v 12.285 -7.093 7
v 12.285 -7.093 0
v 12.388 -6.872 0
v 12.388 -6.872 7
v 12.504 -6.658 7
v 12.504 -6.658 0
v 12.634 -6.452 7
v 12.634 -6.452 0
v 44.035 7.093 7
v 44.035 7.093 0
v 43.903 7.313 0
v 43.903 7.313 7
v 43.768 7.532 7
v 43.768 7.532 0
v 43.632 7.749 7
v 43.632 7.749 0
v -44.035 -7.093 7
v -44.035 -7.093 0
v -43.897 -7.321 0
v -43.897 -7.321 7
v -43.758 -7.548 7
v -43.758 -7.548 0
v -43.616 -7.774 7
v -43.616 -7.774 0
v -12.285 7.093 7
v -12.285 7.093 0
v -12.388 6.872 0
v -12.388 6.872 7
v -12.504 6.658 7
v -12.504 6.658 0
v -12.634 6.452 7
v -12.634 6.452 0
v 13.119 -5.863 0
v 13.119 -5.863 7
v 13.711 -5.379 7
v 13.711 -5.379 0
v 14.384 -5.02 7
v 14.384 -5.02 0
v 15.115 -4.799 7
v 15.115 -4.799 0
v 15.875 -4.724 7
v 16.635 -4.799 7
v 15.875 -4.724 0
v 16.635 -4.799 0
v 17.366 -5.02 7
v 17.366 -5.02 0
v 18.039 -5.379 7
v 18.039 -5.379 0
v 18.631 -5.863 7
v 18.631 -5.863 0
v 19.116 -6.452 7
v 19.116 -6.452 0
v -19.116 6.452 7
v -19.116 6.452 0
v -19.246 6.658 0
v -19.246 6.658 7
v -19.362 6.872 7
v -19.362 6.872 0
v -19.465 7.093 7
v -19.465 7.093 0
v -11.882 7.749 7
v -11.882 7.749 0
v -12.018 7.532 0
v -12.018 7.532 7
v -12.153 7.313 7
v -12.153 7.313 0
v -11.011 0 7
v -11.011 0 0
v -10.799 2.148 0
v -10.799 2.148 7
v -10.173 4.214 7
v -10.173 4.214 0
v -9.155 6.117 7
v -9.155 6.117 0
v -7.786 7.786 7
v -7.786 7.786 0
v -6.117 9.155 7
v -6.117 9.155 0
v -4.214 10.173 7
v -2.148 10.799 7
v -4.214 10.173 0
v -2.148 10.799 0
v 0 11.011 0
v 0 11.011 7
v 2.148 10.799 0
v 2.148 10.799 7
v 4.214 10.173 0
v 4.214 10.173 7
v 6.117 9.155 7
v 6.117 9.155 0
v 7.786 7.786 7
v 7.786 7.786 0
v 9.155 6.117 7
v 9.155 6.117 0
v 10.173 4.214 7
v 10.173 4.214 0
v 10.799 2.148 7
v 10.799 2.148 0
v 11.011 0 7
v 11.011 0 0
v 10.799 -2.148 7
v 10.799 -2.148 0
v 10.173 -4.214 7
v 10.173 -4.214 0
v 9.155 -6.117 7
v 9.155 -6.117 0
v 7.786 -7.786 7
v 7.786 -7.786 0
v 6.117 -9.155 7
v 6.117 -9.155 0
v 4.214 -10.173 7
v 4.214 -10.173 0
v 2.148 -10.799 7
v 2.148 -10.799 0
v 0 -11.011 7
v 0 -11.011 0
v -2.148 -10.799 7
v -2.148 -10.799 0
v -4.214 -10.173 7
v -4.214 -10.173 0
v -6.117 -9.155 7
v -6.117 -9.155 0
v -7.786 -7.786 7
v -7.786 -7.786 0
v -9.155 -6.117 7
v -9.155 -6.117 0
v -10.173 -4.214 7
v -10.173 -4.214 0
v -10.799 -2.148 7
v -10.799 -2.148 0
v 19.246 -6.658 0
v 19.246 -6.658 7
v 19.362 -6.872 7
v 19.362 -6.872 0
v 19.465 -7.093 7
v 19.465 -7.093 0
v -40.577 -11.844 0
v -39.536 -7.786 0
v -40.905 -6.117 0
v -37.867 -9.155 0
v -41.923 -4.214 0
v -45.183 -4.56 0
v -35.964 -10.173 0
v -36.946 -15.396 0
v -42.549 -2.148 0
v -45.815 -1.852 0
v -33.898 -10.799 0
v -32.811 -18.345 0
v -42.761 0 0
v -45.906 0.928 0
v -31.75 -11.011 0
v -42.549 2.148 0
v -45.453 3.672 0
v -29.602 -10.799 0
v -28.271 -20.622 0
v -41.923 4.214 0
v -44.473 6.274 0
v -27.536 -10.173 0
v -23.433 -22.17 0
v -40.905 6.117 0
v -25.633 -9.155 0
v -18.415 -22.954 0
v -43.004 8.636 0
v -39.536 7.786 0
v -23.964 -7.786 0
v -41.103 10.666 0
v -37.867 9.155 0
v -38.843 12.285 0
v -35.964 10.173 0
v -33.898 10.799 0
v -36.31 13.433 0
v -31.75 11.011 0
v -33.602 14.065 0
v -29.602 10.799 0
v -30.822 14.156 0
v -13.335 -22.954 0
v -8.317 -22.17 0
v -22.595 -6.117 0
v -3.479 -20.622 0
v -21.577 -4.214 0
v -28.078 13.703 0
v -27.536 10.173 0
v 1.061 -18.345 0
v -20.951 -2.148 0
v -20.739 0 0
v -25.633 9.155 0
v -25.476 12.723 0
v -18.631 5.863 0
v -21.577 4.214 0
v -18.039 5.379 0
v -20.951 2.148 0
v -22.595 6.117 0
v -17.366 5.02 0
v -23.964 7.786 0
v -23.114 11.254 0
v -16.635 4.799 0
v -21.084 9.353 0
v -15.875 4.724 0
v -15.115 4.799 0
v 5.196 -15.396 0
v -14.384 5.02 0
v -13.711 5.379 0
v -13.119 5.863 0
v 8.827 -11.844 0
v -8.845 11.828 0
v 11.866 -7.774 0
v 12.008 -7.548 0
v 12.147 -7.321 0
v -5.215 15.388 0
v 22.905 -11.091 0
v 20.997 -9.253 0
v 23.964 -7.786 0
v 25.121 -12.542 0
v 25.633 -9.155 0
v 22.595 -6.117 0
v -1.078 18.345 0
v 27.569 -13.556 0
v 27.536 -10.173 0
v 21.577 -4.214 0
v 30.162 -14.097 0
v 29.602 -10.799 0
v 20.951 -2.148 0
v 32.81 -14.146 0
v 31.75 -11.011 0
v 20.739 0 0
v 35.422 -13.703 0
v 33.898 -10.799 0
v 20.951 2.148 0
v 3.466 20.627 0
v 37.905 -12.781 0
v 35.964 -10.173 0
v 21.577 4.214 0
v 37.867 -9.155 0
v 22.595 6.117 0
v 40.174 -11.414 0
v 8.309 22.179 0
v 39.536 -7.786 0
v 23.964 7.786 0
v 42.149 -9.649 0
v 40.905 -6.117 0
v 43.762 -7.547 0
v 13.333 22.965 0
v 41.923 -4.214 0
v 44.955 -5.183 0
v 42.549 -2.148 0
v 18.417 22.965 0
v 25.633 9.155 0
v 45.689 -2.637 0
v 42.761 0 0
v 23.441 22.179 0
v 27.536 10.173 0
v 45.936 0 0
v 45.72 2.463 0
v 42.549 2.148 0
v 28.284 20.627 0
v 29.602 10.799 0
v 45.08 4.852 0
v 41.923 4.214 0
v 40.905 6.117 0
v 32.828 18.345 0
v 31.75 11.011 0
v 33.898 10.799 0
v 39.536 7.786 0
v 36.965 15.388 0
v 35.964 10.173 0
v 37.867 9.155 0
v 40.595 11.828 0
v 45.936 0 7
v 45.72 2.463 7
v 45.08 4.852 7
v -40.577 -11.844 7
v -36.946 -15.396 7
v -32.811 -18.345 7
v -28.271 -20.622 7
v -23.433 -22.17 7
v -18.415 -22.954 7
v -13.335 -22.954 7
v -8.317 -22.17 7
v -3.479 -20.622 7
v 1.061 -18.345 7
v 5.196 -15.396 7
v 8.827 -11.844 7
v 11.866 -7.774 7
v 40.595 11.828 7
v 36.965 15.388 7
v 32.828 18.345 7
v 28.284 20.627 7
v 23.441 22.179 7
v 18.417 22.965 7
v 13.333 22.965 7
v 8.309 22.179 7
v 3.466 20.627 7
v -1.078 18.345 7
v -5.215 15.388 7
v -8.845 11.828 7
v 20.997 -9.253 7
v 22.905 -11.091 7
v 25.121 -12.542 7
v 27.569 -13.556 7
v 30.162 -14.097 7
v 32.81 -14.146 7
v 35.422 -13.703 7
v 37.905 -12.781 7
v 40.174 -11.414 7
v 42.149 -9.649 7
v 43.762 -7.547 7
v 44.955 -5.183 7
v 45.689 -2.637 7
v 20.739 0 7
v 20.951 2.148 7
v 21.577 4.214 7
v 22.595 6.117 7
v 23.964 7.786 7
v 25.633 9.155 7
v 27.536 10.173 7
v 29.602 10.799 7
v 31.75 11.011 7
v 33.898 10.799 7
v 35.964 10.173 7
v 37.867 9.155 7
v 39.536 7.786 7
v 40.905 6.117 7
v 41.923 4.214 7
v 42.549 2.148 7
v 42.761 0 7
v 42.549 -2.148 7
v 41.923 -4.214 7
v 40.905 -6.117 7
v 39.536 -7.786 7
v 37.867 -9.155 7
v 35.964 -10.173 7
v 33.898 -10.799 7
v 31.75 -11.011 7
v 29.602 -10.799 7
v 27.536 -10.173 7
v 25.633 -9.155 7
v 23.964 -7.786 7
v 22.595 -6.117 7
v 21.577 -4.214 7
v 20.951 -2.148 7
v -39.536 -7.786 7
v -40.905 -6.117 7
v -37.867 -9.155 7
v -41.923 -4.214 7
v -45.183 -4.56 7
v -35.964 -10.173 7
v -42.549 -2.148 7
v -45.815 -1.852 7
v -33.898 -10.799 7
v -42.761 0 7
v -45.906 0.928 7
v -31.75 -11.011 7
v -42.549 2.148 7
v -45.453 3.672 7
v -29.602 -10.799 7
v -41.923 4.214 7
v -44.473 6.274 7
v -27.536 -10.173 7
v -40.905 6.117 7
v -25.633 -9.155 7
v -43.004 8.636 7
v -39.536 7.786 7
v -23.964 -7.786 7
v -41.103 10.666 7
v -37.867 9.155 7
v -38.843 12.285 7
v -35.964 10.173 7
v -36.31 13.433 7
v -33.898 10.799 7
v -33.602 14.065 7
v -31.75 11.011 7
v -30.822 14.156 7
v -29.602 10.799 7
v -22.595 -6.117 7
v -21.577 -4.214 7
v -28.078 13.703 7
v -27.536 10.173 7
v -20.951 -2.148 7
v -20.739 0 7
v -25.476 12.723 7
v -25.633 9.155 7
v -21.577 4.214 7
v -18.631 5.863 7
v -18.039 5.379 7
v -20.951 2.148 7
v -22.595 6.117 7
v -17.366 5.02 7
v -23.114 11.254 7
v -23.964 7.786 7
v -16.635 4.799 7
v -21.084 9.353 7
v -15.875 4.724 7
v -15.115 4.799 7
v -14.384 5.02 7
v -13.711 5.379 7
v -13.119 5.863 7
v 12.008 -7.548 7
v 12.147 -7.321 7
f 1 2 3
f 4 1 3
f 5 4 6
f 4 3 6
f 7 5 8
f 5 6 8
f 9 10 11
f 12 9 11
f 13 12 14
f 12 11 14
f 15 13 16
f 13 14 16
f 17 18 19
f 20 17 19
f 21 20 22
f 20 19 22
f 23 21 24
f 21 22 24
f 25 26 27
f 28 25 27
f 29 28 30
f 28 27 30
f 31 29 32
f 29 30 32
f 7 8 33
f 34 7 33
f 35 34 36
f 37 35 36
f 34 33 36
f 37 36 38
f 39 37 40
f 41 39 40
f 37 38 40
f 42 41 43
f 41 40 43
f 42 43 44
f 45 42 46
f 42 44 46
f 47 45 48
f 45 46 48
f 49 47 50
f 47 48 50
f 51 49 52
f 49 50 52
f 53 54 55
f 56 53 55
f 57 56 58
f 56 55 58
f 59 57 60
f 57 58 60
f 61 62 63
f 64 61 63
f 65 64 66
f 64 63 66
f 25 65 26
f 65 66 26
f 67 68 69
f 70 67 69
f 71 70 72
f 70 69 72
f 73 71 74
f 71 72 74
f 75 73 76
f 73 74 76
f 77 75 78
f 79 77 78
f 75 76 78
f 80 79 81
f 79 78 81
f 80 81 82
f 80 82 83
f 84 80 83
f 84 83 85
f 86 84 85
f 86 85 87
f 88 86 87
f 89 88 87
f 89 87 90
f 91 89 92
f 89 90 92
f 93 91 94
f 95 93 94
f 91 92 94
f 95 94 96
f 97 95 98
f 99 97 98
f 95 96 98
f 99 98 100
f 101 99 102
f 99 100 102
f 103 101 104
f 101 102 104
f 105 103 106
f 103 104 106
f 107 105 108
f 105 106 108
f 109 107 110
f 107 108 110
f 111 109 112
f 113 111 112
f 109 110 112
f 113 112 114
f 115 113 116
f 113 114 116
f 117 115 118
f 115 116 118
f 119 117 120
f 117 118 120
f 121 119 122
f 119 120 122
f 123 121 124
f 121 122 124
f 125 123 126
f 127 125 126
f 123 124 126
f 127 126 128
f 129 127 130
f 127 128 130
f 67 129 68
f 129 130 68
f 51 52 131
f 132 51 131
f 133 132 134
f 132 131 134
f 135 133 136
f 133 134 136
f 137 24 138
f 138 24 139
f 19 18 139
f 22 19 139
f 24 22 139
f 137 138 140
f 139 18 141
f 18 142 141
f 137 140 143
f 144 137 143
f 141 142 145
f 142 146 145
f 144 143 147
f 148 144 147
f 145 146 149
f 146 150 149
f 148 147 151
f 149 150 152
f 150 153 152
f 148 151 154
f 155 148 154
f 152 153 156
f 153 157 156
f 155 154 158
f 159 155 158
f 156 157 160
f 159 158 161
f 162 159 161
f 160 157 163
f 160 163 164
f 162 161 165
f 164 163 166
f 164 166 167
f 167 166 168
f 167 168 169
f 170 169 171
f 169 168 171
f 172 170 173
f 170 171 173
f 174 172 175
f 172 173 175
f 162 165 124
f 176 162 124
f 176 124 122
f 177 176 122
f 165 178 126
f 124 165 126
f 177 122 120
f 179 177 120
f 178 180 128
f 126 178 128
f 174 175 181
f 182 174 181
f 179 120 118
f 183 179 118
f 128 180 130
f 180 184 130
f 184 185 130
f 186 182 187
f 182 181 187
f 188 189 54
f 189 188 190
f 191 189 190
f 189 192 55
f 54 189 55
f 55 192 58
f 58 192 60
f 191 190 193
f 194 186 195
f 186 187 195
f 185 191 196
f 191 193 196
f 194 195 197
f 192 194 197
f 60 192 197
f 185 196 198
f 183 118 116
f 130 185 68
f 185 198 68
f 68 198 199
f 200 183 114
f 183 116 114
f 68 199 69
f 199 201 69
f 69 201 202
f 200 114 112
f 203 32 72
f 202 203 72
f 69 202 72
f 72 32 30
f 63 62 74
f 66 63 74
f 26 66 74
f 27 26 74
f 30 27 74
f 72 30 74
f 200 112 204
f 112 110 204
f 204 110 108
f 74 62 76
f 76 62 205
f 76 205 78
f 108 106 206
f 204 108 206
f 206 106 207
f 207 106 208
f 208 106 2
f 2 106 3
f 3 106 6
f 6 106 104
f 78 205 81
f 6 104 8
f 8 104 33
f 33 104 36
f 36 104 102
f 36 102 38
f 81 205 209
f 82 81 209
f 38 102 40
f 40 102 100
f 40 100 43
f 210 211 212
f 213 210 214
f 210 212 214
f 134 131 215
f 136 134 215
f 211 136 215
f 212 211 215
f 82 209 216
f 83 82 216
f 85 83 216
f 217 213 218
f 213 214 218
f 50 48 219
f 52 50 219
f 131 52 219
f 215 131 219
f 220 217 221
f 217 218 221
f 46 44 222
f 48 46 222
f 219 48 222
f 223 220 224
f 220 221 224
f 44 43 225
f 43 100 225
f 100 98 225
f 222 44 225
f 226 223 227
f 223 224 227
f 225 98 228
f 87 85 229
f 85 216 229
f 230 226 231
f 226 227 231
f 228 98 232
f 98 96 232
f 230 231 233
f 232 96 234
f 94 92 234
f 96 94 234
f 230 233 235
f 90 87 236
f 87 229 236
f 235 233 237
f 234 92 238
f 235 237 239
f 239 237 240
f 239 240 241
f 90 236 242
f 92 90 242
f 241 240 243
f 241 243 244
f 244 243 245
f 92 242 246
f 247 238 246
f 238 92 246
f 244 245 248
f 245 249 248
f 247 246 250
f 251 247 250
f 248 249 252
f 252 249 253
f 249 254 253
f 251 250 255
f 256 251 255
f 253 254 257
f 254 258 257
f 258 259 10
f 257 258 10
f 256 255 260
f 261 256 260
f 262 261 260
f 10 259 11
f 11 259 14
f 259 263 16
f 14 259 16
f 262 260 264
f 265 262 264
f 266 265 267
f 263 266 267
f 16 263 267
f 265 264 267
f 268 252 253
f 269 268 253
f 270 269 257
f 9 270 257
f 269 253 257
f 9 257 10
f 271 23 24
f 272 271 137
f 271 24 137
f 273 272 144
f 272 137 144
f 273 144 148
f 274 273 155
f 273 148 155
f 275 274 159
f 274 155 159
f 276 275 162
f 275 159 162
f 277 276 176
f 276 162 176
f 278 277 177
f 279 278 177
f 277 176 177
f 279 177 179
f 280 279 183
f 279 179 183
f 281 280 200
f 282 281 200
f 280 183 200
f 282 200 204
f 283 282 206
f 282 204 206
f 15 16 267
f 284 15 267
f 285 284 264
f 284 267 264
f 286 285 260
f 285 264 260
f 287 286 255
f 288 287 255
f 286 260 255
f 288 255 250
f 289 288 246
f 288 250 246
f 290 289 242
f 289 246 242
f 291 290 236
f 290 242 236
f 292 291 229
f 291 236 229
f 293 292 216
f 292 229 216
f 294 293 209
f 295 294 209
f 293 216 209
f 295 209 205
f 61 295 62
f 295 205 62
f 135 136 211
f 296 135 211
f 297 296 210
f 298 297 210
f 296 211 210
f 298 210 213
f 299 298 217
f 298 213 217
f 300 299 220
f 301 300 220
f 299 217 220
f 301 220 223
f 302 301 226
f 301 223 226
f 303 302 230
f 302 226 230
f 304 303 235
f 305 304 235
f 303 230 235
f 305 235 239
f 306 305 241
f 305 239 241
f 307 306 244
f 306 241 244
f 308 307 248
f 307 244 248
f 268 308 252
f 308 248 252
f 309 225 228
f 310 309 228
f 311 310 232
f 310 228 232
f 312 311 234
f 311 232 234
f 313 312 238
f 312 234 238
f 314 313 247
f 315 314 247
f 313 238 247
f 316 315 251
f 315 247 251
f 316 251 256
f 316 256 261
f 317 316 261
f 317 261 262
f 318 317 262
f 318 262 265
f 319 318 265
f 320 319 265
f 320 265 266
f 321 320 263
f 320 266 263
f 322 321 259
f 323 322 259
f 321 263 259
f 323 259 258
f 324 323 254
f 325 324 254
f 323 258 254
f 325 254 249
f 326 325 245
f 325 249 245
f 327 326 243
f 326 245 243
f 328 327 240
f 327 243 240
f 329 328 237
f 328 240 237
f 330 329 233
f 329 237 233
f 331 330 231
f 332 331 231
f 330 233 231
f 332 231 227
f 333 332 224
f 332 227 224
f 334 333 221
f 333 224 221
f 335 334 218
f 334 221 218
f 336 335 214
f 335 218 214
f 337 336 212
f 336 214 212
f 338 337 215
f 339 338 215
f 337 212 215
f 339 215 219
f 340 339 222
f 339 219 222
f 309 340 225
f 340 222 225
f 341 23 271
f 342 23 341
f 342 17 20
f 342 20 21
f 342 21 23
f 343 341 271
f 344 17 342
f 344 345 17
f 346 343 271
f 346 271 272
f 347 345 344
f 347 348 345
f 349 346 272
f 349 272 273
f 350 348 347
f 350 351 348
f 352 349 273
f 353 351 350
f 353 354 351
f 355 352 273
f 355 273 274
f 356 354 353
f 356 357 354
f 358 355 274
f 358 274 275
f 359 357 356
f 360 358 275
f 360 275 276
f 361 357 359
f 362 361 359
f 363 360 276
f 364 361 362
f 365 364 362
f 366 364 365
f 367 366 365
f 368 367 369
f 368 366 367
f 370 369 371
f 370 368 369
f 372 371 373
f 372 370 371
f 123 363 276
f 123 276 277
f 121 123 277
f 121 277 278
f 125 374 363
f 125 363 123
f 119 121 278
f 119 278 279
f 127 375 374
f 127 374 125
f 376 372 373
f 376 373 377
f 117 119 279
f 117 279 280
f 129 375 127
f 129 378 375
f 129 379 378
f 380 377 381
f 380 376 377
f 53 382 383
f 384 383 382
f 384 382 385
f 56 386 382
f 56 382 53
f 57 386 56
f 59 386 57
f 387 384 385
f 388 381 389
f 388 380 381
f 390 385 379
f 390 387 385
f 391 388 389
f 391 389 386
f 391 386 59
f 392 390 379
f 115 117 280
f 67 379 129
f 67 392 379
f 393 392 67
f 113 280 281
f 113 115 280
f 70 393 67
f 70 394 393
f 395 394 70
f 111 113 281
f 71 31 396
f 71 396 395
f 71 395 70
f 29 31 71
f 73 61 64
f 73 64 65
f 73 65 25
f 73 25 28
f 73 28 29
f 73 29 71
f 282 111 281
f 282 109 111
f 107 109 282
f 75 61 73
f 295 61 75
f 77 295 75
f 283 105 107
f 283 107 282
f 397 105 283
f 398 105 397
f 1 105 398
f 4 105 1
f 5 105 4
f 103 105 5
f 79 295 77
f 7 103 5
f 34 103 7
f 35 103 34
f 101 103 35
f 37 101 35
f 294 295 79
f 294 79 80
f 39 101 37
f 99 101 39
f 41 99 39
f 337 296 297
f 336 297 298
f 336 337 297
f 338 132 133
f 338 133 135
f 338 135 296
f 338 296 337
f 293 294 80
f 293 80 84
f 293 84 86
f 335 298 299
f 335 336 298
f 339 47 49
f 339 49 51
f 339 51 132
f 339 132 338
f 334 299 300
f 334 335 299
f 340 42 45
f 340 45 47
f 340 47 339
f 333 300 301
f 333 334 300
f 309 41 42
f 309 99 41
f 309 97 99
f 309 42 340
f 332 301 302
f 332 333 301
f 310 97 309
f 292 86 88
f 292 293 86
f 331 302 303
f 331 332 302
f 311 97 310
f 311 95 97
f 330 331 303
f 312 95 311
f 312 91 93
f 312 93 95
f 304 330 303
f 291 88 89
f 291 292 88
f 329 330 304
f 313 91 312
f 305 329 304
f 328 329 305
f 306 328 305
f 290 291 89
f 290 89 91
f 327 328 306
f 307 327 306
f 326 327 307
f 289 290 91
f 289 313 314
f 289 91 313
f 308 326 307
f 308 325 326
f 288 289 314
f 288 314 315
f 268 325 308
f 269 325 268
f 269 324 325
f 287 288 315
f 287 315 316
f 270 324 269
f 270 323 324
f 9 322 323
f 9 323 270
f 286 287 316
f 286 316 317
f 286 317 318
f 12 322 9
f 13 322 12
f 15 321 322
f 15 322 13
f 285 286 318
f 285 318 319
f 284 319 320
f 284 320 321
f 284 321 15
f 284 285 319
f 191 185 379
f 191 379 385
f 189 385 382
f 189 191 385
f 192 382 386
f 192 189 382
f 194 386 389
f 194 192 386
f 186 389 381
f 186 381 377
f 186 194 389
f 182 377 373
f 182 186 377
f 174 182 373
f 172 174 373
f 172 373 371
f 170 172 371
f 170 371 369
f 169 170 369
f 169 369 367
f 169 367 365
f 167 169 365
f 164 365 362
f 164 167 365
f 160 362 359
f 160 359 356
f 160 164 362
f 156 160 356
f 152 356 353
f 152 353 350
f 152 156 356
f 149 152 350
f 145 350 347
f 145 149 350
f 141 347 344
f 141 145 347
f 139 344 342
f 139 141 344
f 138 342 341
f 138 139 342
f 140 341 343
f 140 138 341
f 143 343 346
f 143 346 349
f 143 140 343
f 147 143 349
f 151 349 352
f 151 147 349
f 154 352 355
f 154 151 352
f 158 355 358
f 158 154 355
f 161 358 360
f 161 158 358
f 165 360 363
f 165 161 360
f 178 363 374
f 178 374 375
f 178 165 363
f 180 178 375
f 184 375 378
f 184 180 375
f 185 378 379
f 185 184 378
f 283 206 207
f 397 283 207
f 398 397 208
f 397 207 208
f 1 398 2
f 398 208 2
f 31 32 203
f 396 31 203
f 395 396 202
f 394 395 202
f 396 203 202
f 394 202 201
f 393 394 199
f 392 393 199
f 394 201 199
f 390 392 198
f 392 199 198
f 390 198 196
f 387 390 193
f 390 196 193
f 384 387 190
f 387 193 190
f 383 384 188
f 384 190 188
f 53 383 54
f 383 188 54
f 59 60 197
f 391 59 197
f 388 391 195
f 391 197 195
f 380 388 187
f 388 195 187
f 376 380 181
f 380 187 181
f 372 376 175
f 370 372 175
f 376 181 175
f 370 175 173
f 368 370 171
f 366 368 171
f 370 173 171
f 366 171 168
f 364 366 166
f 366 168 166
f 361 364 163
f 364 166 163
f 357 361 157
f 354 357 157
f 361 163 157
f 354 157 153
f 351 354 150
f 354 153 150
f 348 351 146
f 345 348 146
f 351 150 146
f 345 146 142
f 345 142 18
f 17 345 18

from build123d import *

# Parameters (mm, degrees)
F0_R     = 11.0109
F1_DEPTH = 7


with BuildPart() as f1:
    # F0 (on Top) → F1 (new body)
    with BuildSketch(Plane.XY):
        with BuildLine():
            Line((14.1859, 0), (11.0109, 0))
            ThreePointArc((11.0109, 0), (0, -11.0109), (-11.0109, 0))
            Line((-11.0109, 0), (-14.1859, 0))
            ThreePointArc((-14.1859, 0), (-4.0564627793, -13.5935598182), (11.8660062633, -7.7741658182))
            ThreePointArc((11.8660062633, -7.7741658182), (12.0777532722, -7.4348353952), (12.2853497755, -7.09295))
            ThreePointArc((12.2853497755, -7.09295), (12.4445825488, -6.7642227487), (12.6338376613, -6.4518140673))
            ThreePointArc((12.6338376613, -6.4518140673), (13.7924275689, -3.3179361907), (14.1859, 0))
        make_face()
        with BuildLine():
            ThreePointArc((-11.0109, 0), (0, 11.0109), (11.0109, 0))
            Line((11.0109, 0), (14.1859, 0))
            ThreePointArc((14.1859, 0), (4.0422659472, 13.5977882327), (-11.882216203, 7.7493675171))
            ThreePointArc((-11.882216203, 7.7493675171), (-12.0857093478, 7.4223418162), (-12.2853497755, 7.09295))
            ThreePointArc((-12.2853497755, 7.09295), (-12.4445825488, 6.7642227487), (-12.6338376613, 6.4518140673))
            ThreePointArc((-12.6338376613, 6.4518140673), (-13.7924275689, 3.3179361907), (-14.1859, 0))
            Line((-14.1859, 0), (-11.0109, 0))
        make_face()
        with BuildLine():
            Line((17.5641, 0), (14.1859, 0))
            ThreePointArc((14.1859, 0), (13.7924275689, -3.3179361907), (12.6338376613, -6.4518140673))
            ThreePointArc((12.6338376613, -6.4518140673), (15.875, -4.7244), (19.1161623387, -6.4518140673))
            ThreePointArc((19.1161623387, -6.4518140673), (17.9575724311, -3.3179361907), (17.5641, 0))
        make_face()
        with BuildLine():
            ThreePointArc((-11.882216203, 7.7493675171), (4.0422659472, 13.5977882327), (14.1859, 0))
            Line((14.1859, 0), (17.5641, 0))
            ThreePointArc((17.5641, 0), (27.7077340528, 13.5977882327), (43.632216203, 7.7493675171))
            ThreePointArc((43.632216203, 7.7493675171), (15.875, 23.0632), (-11.882216203, 7.7493675171))
        make_face()
        with BuildLine():
            Line((-17.5641, 0), (-14.1859, 0))
            ThreePointArc((-14.1859, 0), (-13.7924275689, 3.3179361907), (-12.6338376613, 6.4518140673))
            ThreePointArc((-12.6338376613, 6.4518140673), (-15.875, 4.7244), (-19.1161623387, 6.4518140673))
            ThreePointArc((-19.1161623387, 6.4518140673), (-17.9575724311, 3.3179361907), (-17.5641, 0))
        make_face()
        with BuildLine():
            ThreePointArc((11.8660062633, -7.7741658182), (-4.0564627793, -13.5935598182), (-14.1859, 0))
            Line((-14.1859, 0), (-17.5641, 0))
            ThreePointArc((-17.5641, 0), (-27.6935372207, -13.5935598182), (-43.6160062633, -7.7741658182))
            ThreePointArc((-43.6160062633, -7.7741658182), (-15.875, -23.0520875), (11.8660062633, -7.7741658182))
        make_face()
        with BuildLine():
            ThreePointArc((43.632216203, 7.7493675171), (27.7077340528, 13.5977882327), (17.5641, 0))
            ThreePointArc((17.5641, 0), (17.9575724311, -3.3179361907), (19.1161623387, -6.4518140673))
            ThreePointArc((19.1161623387, -6.4518140673), (19.3054174512, -6.7642227487), (19.4646502245, -7.09295))
            ThreePointArc((19.4646502245, -7.09295), (35.4215810919, -13.7025271792), (45.9359, 0))
            ThreePointArc((45.9359, 0), (45.4525271792, 3.6715810919), (44.0353497755, 7.09295))
            ThreePointArc((44.0353497755, 7.09295), (43.8357093478, 7.4223418162), (43.632216203, 7.7493675171))
        make_face()
        with BuildLine():
            ThreePointArc((42.7609, 0), (31.75, -11.0109), (20.7391, 0))
            ThreePointArc((20.7391, 0), (31.75, 11.0109), (42.7609, 0))
        make_face(mode=Mode.SUBTRACT)
        with BuildLine():
            ThreePointArc((-43.6160062633, -7.7741658182), (-27.6935372207, -13.5935598182), (-17.5641, 0))
            ThreePointArc((-17.5641, 0), (-17.9575724311, 3.3179361907), (-19.1161623387, 6.4518140673))
            ThreePointArc((-19.1161623387, 6.4518140673), (-19.3054174512, 6.7642227487), (-19.4646502245, 7.09295))
            ThreePointArc((-19.4646502245, 7.09295), (-38.84295, 12.2853497755), (-44.0353497755, -7.09295))
            ThreePointArc((-44.0353497755, -7.09295), (-43.8277532722, -7.4348353952), (-43.6160062633, -7.7741658182))
        make_face()
        with Locations((-31.75, 0)):
            Circle(F0_R, mode=Mode.SUBTRACT)
    extrude(amount=F1_DEPTH)


solid = f1.part
